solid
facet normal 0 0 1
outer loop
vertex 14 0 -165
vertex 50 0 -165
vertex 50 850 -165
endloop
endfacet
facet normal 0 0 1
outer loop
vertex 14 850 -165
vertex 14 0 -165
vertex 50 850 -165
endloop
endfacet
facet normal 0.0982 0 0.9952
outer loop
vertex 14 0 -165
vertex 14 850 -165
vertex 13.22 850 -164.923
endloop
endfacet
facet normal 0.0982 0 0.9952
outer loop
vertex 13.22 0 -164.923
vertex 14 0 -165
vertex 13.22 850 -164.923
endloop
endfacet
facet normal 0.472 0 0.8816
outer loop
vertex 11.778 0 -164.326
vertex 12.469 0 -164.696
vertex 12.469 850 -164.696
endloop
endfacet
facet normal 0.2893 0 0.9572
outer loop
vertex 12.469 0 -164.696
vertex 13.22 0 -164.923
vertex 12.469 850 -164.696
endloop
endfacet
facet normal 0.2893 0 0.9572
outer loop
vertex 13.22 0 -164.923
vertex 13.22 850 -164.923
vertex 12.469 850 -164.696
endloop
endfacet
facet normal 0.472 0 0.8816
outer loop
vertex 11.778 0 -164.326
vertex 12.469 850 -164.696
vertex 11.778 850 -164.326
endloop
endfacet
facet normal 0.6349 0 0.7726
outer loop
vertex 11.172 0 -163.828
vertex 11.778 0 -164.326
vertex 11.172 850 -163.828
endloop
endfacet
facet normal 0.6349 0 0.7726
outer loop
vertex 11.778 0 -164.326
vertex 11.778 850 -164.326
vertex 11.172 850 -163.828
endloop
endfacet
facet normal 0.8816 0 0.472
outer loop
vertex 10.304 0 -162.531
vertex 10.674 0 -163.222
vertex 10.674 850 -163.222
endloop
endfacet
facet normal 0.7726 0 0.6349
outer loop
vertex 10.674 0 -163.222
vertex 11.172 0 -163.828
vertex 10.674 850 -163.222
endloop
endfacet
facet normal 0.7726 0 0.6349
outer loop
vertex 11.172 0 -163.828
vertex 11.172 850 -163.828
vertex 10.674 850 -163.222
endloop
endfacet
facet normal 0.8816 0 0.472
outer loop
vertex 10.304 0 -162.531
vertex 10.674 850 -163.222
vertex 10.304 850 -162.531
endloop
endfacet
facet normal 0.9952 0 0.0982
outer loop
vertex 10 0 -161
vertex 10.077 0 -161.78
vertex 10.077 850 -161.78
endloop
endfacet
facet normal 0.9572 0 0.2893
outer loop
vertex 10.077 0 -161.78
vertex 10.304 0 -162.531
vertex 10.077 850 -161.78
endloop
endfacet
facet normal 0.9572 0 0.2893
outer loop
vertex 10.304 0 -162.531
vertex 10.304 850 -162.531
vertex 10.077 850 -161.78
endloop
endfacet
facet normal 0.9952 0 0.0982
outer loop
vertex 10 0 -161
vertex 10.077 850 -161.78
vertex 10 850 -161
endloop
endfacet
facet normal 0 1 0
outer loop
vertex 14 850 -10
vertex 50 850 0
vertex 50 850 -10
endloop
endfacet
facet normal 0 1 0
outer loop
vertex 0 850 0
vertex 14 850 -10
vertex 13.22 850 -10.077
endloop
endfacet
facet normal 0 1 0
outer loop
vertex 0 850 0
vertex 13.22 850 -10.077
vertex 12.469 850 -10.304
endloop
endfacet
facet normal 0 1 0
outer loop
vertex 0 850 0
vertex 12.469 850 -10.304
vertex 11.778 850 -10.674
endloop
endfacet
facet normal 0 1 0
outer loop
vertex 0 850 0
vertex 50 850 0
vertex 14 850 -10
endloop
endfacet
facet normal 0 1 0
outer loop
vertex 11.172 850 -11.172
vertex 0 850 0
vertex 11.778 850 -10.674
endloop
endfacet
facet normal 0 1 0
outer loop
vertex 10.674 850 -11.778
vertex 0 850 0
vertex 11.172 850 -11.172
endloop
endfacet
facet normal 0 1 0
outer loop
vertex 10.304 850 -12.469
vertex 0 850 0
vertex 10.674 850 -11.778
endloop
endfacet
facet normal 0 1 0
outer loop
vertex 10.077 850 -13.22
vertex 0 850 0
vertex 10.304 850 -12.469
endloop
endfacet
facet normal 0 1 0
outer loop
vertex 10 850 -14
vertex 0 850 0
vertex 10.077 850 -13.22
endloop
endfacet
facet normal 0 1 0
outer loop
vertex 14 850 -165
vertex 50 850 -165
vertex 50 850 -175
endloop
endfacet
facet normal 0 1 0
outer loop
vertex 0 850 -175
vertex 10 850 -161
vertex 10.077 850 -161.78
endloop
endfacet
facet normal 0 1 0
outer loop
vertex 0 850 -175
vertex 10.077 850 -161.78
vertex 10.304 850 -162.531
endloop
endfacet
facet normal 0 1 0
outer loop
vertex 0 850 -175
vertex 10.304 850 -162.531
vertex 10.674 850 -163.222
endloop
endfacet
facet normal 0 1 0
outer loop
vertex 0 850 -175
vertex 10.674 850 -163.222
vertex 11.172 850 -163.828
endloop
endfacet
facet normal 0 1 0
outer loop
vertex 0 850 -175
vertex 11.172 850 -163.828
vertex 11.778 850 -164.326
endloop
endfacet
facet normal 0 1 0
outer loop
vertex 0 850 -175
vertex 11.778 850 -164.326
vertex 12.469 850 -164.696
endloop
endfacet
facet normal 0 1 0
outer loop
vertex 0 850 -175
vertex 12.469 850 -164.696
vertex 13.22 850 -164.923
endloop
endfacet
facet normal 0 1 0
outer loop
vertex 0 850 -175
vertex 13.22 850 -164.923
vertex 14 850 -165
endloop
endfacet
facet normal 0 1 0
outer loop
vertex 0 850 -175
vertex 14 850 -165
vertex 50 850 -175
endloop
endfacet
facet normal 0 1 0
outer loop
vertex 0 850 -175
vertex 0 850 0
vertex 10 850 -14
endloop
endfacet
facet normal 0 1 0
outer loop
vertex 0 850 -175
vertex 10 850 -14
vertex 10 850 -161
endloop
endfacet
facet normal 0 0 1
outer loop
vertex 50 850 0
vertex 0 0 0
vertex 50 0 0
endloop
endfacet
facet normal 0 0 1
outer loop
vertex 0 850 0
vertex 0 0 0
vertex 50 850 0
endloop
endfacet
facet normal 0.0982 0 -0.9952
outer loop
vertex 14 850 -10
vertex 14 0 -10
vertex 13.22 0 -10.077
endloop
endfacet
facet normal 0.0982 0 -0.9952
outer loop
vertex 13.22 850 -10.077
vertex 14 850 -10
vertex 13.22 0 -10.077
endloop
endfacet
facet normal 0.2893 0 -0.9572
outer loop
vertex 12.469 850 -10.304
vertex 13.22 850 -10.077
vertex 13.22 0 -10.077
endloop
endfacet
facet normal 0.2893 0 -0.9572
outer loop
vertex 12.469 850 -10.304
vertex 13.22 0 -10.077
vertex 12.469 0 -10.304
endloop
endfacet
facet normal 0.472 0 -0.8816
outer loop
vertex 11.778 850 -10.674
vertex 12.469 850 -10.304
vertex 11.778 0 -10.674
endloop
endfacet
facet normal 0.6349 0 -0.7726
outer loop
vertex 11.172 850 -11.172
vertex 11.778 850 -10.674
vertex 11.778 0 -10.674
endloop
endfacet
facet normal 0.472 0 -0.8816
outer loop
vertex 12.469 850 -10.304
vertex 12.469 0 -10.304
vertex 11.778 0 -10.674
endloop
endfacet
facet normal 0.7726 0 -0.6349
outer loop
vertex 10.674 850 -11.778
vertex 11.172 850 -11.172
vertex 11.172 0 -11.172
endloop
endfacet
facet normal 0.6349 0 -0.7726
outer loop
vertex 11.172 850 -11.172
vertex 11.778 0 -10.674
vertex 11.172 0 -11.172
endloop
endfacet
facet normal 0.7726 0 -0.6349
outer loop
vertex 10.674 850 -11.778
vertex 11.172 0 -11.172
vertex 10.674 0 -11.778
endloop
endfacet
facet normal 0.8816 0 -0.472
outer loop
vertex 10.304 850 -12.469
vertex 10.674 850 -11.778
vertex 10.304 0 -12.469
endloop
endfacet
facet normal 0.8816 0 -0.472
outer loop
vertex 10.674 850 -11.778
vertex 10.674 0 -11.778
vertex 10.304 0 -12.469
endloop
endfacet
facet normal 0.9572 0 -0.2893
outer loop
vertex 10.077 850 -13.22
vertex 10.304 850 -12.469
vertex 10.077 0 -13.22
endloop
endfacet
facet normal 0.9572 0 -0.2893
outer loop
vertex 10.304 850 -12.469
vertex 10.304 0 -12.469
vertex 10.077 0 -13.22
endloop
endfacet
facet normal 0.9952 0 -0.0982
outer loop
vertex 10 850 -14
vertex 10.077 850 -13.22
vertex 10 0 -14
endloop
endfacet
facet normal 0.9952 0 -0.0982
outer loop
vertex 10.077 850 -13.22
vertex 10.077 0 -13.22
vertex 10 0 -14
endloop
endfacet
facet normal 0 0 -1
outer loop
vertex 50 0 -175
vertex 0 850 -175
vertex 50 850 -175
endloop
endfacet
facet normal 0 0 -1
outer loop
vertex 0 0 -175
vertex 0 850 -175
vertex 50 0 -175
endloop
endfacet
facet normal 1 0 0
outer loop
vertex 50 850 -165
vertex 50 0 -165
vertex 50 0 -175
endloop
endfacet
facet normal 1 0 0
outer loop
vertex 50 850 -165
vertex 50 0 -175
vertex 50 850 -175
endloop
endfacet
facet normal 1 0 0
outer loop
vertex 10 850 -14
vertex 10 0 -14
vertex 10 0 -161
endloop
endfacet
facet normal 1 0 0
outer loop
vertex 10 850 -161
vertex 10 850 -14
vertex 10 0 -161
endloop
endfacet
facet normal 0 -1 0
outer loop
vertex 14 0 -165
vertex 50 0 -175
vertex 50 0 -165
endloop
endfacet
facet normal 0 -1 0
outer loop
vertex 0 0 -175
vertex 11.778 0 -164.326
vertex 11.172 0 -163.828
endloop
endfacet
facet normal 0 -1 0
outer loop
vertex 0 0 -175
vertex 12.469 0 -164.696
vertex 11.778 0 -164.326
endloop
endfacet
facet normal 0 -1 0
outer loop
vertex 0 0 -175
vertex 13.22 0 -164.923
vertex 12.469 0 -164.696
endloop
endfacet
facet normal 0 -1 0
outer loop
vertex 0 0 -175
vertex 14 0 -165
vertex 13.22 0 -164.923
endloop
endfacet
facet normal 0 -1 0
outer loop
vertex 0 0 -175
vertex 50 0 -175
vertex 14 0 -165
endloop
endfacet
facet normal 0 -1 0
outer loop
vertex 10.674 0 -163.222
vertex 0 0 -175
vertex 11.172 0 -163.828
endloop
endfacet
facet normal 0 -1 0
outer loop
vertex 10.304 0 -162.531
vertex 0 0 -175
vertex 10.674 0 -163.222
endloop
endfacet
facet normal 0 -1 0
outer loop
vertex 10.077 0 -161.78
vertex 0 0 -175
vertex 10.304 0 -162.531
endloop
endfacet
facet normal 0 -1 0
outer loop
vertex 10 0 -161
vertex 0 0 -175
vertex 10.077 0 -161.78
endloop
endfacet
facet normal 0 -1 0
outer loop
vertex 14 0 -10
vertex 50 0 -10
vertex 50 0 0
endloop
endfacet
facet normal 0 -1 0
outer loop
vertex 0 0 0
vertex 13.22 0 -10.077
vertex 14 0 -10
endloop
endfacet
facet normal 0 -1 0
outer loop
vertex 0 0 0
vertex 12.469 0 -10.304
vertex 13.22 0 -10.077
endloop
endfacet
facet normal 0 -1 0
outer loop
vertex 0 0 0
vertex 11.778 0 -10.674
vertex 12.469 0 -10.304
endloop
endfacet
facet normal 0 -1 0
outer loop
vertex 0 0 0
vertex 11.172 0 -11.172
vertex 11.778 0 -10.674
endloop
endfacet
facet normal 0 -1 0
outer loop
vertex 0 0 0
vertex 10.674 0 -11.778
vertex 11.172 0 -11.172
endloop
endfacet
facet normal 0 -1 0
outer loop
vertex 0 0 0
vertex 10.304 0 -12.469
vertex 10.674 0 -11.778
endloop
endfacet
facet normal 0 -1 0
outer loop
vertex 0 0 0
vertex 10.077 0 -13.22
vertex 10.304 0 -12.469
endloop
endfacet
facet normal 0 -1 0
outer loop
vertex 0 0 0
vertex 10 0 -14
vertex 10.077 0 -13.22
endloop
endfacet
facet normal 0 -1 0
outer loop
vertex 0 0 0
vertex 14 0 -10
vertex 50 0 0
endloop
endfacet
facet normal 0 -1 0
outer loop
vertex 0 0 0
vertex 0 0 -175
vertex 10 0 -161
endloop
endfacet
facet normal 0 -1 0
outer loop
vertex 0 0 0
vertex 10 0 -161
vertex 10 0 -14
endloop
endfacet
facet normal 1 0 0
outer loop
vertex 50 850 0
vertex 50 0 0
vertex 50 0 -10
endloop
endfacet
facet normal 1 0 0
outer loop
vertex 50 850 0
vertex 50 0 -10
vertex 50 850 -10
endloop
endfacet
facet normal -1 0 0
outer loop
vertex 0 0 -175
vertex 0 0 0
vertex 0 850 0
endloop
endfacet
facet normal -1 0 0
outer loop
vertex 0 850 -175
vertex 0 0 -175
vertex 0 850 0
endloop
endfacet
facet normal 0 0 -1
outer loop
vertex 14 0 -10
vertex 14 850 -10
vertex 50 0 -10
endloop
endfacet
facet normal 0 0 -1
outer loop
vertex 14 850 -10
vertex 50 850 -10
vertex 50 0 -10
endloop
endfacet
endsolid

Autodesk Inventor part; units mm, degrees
ref_plane "YZ Plane" through (0, 0, 0) normal (1, 0, 0) x (0, 1, 0)
ref_plane "XZ Plane" through (0, 0, 0) normal (0, 1, 0) x (-1, 0, 0)
ref_plane "XY Plane" through (0, 0, 0) normal (0, 0, 1) x (1, 0, 0)
sketch "Sketch1" plane through (0, 0, 0) normal (1, 0, 0) x (0, 1, 0)
  line L0 (0, 0) -> (850, 0)
  line L1 (850, 0) -> (850, -175)
  line L2 (850, -175) -> (0, -175)
  line L3 (0, -175) -> (0, 0)
  dimension "d0" = 850
  dimension "d1" = 175
extrude "Extrusion1" add sketch "Sketch1" along normal blind 50
sketch "Sketch2" plane through (50, 0, 0) normal (1, 0, 0) x (0, 0, -1)
  line L0 (0, 0) -> (175, 0) projected
  line L1 (175, 850) -> (0, 850) projected
  line L2 (10, 0) -> (165, 0)
  line L3 (165, 0) -> (165, 850)
  line L4 (165, 850) -> (10, 850)
  line L5 (10, 850) -> (10, 0)
  dimension "d4" = 155
extrude "Extrusion2" cut sketch "Sketch2" against normal blind 40
fillet "Fillet1" radius 4 2 edges at (10, 425, -165) (10, 425, -10)
equation "\"BendRadius\" = Thickness"
equation "\"BendReliefWidth\" = Thickness"
equation "\"BendReliefDepth\" = 0.5 * Thickness"
equation "\"CornerReliefSize\" = 4 * Thickness"
equation "\"MinimumRemnant\" = 2 * Thickness"
equation "\"TransitionRadius\" = BendRadius"
equation "\"JacobiRadiusSize\" = BendRadius"
equation "\"GapSize\" = Thickness"
equation "\"Thickness\" = 0.5"
properties part number "Base2"
